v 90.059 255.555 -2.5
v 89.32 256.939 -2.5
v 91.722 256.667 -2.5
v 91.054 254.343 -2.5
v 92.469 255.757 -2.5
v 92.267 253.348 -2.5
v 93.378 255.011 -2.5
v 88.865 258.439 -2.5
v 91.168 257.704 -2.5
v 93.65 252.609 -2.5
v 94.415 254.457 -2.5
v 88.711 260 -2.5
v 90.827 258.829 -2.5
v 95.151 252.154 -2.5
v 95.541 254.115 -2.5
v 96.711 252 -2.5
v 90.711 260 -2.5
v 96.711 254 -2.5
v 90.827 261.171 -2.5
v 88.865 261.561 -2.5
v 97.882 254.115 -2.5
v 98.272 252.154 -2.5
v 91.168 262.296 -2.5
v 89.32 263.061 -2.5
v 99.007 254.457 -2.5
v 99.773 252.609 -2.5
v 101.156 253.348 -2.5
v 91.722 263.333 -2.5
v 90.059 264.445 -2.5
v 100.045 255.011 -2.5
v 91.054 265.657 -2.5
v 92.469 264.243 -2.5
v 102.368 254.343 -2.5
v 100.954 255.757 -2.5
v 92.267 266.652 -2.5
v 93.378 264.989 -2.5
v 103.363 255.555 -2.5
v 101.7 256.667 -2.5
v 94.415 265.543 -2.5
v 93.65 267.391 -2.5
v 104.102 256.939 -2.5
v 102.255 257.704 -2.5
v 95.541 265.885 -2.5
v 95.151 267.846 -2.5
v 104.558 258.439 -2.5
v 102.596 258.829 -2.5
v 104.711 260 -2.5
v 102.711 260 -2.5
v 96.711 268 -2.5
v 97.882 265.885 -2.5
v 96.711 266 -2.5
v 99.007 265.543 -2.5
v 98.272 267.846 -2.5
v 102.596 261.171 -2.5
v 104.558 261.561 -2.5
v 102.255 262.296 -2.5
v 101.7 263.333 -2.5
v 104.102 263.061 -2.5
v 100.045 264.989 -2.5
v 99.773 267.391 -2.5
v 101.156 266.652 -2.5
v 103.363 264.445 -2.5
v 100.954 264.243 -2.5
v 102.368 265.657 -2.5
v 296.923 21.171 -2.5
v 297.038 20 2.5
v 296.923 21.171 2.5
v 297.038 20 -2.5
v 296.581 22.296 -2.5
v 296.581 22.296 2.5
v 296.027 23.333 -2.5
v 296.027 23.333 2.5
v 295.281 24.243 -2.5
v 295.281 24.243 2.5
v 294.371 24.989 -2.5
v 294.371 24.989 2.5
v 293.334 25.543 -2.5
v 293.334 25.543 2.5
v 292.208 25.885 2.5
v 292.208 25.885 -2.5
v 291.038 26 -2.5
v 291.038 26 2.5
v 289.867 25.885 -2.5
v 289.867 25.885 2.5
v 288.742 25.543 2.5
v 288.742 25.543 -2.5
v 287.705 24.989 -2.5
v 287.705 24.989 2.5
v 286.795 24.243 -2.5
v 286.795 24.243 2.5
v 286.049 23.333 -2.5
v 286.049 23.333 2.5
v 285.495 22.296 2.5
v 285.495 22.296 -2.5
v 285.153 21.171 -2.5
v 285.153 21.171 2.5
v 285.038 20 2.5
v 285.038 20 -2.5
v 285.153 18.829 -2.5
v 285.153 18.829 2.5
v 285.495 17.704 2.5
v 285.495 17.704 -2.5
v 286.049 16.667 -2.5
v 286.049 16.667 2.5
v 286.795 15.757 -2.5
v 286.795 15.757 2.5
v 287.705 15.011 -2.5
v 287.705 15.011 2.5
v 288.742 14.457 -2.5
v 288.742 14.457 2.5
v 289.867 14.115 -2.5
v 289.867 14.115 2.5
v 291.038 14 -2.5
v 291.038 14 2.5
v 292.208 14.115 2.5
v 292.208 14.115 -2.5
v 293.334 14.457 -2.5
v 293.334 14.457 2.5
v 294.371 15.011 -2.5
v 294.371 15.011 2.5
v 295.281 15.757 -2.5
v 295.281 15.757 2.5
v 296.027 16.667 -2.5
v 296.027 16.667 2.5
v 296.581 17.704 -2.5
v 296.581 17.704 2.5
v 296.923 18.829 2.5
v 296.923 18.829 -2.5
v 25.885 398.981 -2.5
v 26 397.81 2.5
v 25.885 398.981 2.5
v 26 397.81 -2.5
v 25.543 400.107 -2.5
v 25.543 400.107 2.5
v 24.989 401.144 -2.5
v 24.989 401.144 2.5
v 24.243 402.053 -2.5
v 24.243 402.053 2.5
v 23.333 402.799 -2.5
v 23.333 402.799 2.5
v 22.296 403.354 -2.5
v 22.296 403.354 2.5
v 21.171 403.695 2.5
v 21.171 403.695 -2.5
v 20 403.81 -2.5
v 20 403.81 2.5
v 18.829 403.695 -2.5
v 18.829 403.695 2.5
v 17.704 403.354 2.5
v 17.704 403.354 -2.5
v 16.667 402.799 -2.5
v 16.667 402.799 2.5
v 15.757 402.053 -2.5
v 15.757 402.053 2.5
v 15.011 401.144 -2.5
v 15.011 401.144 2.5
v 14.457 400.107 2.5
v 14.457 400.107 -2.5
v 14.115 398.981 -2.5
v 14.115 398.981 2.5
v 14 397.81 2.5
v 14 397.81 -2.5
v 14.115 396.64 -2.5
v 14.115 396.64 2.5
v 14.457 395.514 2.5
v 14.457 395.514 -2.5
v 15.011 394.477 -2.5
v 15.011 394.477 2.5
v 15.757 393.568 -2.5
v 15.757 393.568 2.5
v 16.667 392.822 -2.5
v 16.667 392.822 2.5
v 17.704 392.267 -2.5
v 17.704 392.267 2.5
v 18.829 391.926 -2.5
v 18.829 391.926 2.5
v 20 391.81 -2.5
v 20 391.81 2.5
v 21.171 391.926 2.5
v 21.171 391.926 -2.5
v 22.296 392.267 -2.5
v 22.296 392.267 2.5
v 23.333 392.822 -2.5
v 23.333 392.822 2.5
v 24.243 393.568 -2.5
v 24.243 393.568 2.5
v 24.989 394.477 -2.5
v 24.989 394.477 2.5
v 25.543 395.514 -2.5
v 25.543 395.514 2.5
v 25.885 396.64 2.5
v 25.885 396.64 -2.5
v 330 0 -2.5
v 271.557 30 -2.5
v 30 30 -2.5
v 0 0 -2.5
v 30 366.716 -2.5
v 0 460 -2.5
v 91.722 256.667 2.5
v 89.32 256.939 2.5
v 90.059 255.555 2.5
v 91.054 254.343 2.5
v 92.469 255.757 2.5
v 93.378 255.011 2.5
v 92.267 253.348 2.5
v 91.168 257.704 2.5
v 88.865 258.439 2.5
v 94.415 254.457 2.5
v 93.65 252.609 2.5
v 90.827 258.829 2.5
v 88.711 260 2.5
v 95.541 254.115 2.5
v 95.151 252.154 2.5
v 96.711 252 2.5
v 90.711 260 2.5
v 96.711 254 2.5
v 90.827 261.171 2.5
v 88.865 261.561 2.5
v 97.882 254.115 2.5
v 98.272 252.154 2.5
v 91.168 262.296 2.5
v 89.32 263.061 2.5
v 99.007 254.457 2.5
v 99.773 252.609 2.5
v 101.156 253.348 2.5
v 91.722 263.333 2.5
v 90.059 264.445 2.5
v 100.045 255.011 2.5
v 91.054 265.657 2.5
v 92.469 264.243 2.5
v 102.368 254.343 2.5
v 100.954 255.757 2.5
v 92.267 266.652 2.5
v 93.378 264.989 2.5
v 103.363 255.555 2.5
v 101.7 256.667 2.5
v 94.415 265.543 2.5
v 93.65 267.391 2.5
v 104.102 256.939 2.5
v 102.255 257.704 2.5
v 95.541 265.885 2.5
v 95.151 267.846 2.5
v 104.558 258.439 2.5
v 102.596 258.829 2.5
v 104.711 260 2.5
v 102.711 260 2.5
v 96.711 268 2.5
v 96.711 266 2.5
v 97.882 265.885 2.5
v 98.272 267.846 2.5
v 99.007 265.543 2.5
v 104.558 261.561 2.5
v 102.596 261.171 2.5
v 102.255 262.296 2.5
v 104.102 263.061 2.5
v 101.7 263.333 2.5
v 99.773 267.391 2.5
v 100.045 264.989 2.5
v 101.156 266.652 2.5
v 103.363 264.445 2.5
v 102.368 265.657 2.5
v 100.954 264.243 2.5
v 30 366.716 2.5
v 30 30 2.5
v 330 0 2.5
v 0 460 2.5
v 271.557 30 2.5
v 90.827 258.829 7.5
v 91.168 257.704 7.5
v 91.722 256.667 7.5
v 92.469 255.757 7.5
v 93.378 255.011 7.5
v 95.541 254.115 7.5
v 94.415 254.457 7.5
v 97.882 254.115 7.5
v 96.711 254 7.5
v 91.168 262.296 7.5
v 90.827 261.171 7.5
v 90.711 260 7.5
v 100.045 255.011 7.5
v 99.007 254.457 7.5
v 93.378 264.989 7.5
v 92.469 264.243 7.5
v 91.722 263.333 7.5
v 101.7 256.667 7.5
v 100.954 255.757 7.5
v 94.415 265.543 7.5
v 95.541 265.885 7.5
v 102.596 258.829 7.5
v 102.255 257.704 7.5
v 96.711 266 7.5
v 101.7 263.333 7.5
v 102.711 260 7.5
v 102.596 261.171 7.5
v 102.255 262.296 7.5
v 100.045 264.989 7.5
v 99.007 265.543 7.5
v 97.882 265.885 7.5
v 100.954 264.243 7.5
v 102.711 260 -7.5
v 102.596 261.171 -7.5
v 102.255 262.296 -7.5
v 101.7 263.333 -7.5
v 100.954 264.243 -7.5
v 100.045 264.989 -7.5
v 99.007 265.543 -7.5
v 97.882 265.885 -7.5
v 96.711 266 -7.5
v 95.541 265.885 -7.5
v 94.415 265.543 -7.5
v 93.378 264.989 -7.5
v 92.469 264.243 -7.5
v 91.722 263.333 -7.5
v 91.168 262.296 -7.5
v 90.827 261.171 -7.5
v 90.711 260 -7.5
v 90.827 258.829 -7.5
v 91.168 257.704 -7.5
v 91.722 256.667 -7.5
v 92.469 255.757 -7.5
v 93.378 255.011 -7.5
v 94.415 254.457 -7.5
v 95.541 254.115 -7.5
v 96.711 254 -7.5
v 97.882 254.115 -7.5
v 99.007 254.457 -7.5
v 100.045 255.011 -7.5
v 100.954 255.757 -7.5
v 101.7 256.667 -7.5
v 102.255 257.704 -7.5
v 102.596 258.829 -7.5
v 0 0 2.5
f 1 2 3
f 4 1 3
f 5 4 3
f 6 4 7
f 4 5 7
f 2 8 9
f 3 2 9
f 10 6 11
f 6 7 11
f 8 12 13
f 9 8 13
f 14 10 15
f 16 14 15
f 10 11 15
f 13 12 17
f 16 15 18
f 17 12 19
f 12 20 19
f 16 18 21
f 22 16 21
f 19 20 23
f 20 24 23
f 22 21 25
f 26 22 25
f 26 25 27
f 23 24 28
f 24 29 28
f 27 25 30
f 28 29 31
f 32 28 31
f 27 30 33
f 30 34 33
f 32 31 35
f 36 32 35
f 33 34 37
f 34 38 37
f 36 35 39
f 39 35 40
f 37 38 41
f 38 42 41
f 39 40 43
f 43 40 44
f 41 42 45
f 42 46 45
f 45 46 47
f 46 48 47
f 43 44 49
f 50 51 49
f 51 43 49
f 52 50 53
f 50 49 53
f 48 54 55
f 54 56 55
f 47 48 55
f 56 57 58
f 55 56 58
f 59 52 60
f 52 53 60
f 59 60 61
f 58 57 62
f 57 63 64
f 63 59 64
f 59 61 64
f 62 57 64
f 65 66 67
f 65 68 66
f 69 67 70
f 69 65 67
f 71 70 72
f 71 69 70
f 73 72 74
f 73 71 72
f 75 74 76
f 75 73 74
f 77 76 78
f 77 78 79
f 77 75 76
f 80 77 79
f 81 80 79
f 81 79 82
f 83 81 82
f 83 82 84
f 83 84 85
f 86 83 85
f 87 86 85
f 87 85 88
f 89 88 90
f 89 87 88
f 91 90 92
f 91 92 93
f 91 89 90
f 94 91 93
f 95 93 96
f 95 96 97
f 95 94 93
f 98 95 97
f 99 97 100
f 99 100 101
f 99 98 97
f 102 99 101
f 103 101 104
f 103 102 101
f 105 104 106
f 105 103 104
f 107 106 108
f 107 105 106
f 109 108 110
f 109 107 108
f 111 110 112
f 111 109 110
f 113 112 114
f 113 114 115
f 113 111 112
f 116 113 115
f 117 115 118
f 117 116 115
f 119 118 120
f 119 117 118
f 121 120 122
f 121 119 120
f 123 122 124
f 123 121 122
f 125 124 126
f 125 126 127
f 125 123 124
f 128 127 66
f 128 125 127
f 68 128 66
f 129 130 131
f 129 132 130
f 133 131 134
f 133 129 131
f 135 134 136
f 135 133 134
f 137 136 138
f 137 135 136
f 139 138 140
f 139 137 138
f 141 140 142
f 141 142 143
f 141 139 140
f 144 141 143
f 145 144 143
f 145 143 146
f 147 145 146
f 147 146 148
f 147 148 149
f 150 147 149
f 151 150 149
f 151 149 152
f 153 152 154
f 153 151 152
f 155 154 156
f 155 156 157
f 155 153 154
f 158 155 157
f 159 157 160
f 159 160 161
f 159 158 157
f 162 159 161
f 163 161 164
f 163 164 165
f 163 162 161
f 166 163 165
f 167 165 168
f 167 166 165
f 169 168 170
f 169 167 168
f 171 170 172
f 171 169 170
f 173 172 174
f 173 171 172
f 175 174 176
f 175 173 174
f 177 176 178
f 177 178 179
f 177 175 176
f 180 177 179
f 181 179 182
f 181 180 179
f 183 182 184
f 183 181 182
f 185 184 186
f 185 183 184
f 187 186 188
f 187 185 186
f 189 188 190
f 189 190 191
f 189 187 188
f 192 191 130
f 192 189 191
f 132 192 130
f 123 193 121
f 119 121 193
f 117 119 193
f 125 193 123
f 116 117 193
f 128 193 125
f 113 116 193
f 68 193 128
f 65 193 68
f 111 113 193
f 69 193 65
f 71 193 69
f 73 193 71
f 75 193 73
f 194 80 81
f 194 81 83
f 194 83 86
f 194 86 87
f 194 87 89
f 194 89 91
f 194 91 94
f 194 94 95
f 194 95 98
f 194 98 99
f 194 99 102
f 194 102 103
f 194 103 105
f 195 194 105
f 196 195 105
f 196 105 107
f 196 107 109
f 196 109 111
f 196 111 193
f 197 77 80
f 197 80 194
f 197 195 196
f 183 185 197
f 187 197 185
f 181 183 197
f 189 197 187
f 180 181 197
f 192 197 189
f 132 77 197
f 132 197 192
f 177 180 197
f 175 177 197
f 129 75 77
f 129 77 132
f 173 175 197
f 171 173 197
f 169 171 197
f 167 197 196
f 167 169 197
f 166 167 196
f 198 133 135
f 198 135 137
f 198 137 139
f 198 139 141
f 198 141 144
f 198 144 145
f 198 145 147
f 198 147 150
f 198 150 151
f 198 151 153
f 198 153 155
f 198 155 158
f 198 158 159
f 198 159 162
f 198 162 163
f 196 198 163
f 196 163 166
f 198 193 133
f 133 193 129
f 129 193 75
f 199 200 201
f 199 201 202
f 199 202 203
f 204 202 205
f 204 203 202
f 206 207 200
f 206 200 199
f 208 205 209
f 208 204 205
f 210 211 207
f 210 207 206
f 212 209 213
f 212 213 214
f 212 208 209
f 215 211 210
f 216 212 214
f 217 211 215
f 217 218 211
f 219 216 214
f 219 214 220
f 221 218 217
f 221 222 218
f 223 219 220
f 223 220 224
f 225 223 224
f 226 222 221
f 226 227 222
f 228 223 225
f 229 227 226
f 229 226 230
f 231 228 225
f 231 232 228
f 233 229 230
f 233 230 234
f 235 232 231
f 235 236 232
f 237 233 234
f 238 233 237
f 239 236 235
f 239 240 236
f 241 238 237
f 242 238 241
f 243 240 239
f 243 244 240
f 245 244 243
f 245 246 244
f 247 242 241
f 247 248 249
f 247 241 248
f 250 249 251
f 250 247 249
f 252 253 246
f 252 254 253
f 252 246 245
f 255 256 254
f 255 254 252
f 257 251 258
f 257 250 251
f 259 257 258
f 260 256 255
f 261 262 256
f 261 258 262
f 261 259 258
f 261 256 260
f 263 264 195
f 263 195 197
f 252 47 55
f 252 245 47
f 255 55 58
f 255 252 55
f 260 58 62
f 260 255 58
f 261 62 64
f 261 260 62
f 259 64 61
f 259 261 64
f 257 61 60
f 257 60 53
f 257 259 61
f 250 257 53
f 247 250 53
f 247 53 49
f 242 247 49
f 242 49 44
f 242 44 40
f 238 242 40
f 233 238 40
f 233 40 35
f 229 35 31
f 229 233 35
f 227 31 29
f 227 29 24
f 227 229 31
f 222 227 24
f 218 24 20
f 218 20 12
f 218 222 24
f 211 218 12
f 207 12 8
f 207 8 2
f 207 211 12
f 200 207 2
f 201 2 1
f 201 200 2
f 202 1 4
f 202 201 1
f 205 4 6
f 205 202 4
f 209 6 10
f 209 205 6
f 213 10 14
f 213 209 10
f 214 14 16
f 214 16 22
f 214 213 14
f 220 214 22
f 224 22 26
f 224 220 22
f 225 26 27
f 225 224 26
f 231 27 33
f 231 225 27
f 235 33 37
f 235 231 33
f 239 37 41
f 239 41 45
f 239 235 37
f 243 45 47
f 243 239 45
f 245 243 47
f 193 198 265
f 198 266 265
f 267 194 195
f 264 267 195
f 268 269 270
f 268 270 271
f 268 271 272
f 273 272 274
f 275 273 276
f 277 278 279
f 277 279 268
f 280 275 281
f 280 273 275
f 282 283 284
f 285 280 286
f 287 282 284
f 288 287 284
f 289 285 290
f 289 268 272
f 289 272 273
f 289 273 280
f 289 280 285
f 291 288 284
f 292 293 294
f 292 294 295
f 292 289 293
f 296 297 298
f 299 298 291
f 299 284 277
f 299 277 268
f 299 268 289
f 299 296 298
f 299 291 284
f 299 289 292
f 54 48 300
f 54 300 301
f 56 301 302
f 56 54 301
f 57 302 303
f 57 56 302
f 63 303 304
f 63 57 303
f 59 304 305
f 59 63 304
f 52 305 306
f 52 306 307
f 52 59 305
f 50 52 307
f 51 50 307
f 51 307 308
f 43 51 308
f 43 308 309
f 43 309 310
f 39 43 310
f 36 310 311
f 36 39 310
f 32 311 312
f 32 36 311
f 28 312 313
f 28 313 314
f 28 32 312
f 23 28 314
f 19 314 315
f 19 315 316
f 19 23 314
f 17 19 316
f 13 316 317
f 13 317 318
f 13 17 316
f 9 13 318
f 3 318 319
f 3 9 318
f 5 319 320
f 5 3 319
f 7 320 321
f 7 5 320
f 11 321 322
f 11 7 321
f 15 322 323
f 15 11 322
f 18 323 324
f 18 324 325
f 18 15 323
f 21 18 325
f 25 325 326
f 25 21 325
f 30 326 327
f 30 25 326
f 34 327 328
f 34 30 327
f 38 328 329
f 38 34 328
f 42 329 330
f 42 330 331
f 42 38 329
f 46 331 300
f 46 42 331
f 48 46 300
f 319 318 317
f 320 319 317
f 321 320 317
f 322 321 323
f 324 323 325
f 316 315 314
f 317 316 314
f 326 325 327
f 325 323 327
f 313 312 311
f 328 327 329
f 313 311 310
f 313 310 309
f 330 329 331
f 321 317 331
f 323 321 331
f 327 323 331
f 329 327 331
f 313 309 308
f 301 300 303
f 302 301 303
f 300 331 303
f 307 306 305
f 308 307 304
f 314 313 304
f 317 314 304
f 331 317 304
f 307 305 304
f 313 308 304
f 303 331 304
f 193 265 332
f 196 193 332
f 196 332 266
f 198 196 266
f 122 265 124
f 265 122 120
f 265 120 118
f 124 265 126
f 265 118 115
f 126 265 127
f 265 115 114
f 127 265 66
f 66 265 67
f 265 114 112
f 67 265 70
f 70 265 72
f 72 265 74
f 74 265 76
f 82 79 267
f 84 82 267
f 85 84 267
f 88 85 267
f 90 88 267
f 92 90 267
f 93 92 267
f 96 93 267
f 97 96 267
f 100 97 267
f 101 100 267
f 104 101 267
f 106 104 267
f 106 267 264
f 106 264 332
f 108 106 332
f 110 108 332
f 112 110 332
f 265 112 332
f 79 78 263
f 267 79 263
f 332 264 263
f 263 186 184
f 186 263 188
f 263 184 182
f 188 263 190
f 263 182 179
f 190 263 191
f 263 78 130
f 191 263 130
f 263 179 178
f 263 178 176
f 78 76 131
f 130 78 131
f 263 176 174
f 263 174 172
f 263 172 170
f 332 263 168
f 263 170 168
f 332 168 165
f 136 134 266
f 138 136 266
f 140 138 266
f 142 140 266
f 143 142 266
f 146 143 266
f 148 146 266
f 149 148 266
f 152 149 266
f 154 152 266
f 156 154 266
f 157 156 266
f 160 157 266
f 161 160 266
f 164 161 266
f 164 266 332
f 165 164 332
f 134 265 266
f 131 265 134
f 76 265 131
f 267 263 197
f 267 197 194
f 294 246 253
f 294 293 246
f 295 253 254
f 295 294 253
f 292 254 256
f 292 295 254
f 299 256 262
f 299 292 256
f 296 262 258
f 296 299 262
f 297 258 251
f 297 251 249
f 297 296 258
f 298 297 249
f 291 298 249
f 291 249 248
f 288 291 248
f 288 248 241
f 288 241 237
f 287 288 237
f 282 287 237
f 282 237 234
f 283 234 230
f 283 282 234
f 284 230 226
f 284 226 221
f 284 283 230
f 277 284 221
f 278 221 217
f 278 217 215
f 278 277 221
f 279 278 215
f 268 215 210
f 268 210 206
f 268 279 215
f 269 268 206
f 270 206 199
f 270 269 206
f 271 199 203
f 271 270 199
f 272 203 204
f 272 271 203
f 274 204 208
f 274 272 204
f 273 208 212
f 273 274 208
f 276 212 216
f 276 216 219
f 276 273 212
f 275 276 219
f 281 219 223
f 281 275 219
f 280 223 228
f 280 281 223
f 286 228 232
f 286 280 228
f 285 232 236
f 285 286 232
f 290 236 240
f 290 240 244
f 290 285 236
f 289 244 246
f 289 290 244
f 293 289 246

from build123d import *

# Parameters (mm, degrees)
SKETCH_1_R      = 6
EXTRUDE_1_DEPTH = 2.5
SKETCH_2_R      = 8
EXTRUDE_2_DEPTH = 2.5
SKETCH_3_R      = 6
EXTRUDE_3_DEPTH = 7.5


with BuildPart() as part:
    # 草图1 → 凸台-拉伸1 (new, symmetric)
    with BuildSketch(Plane.XY):
        Polygon((0, 0), (0, 460), (330, 0), align=None)
        with Locations((20, 397.810473079)):
            Circle(SKETCH_1_R, mode=Mode.SUBTRACT)
        with Locations((291.037948079, 20)):
            Circle(SKETCH_1_R, mode=Mode.SUBTRACT)
        Polygon((30, 30), (30, 366.715709619), (271.556922118, 30), align=None, mode=Mode.SUBTRACT)
    extrude(amount=EXTRUDE_1_DEPTH, both=True)


with BuildPart() as body_2:
    # 草图2 → 凸台-拉伸2 (new, symmetric)
    with BuildSketch(Plane.XY):
        with Locations((96.711231784, 260)):
            Circle(SKETCH_2_R)
    extrude(amount=EXTRUDE_2_DEPTH, both=True)

    # 草图3 → 凸台-拉伸3 (add, symmetric)
    with BuildSketch(Plane.XY):
        with Locations((96.711231784, 260)):
            Circle(SKETCH_3_R)
    extrude(amount=EXTRUDE_3_DEPTH, both=True)


solid = Compound([part.part, body_2.part])
